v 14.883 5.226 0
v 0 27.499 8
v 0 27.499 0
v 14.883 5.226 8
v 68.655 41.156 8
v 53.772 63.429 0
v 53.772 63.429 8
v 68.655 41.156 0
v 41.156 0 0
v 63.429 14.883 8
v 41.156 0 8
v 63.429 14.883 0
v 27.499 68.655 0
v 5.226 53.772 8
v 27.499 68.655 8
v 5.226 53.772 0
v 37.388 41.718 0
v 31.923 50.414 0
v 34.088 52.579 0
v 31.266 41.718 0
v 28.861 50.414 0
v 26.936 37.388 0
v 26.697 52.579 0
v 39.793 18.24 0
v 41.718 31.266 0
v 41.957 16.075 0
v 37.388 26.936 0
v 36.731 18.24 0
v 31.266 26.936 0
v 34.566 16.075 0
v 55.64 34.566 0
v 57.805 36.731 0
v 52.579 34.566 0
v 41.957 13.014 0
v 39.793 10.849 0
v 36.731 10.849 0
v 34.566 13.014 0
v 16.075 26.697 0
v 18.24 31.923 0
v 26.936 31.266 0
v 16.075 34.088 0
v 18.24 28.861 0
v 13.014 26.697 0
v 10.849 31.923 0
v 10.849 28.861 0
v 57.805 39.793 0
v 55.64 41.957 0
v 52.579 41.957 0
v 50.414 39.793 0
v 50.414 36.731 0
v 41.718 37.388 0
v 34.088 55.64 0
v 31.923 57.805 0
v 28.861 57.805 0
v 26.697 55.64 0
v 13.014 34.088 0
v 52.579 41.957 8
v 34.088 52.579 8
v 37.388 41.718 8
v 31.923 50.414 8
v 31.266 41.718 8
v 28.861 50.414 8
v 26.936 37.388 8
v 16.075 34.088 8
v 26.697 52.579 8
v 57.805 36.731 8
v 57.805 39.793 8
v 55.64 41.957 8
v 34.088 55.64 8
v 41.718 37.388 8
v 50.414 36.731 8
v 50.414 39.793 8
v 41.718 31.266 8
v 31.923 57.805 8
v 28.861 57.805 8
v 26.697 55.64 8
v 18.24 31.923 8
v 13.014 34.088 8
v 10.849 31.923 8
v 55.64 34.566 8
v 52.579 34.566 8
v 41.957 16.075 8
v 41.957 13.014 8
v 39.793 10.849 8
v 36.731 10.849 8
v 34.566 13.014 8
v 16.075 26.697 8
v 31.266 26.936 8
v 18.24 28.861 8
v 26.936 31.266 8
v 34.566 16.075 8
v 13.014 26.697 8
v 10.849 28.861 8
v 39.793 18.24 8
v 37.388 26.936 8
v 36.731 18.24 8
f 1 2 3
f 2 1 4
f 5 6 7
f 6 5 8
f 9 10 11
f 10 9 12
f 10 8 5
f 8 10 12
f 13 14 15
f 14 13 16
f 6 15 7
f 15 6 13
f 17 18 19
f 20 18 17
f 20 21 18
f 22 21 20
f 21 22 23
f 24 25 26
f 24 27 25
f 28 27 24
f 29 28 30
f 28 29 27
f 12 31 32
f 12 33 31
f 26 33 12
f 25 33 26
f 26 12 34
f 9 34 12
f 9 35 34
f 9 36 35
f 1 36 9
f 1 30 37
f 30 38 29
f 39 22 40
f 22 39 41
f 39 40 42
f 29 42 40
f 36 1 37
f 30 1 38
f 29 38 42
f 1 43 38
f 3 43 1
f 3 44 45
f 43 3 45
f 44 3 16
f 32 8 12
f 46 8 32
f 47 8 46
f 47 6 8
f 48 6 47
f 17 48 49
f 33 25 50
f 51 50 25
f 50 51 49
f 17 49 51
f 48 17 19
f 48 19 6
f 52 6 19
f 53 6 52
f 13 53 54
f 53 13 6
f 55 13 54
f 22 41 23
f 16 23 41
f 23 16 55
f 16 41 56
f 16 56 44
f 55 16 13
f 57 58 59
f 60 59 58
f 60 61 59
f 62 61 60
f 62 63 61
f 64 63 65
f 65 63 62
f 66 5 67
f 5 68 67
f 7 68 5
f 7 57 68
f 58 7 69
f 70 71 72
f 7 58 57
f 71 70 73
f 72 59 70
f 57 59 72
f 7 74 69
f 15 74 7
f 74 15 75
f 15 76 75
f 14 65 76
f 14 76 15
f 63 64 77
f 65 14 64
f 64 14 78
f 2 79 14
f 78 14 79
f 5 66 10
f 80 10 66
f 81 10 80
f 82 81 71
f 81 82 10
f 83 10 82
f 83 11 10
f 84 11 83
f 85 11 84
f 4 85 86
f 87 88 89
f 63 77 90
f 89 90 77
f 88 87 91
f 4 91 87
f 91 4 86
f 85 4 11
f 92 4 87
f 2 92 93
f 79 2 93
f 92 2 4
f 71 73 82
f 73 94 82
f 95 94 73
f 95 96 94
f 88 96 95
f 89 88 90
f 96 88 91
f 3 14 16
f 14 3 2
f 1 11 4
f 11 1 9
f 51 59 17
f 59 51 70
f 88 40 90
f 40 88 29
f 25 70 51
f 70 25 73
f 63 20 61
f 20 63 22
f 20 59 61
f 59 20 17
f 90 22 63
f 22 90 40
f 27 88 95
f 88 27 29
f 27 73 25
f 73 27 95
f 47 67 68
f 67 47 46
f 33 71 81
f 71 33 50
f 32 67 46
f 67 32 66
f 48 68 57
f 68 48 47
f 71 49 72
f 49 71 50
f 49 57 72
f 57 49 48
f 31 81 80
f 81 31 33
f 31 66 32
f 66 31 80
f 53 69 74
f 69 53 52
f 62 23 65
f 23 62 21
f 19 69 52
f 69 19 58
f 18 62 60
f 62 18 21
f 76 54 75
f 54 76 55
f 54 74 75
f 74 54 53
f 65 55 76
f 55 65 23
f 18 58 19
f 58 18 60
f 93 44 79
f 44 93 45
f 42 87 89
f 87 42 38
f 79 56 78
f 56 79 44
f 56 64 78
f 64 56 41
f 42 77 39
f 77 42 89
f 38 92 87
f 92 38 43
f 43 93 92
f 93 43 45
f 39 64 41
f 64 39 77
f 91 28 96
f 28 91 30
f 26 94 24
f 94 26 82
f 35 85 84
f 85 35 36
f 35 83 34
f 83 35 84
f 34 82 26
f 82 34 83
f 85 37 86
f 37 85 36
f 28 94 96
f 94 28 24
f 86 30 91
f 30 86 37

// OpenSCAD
$fn = 32;

// ----------------------------------------------------------------------
// Polygon plate: 8-gon R35, 4 bolt windows
// ----------------------------------------------------------------------

// --- parameters (mm) ---
sides = 8;                // number of polygon sides
plate_r = 35;             // circumscribed radius of the polygon
bore_r = 8;               // centre bore radius
bolts = 4;                // number of bolt windows
ring_r = 20.17;           // bolt-circle radius
bolt_r = 4;               // bolt window radius
plate_t = 8;              // plate thickness, Z (extrusion height)

plate_d = 2 * plate_r;  // circumscribed diameter
bore_d = 2 * bore_r;  // centre bore diameter
bolt_d = 2 * bolt_r;  // bolt window diameter
ring_d = 2 * ring_r;  // bolt-circle diameter

profile = [[68.655, 41.156], [53.772, 63.429], [27.499, 68.655], [5.226, 53.772], [0, 27.499], [14.883, 5.226], [41.156, 0], [63.429, 14.883]];  // primary outline, 8 points, counter clockwise
void_1 = [[41.718, 37.388], [37.388, 41.718], [31.266, 41.718], [26.936, 37.388], [26.936, 31.266], [31.266, 26.936], [37.388, 26.936], [41.718, 31.266]];  // centre bore, 8 points
void_2 = [[57.805, 39.793], [55.64, 41.957], [52.579, 41.957], [50.414, 39.793], [50.414, 36.731], [52.579, 34.566], [55.64, 34.566], [57.805, 36.731]];  // bolt window 1, 8 points
void_3 = [[34.088, 55.64], [31.923, 57.805], [28.861, 57.805], [26.697, 55.64], [26.697, 52.579], [28.861, 50.414], [31.923, 50.414], [34.088, 52.579]];  // bolt window 2, 8 points
void_4 = [[18.24, 31.923], [16.075, 34.088], [13.014, 34.088], [10.849, 31.923], [10.849, 28.861], [13.014, 26.697], [16.075, 26.697], [18.24, 28.861]];  // bolt window 3, 8 points
void_5 = [[41.957, 16.075], [39.793, 18.24], [36.731, 18.24], [34.566, 16.075], [34.566, 13.014], [36.731, 10.849], [39.793, 10.849], [41.957, 13.014]];  // bolt window 4, 8 points

// --- the one profile operation ---
difference() {
  linear_extrude(height = plate_t) polygon(points = profile);
  translate([0, 0, -1])
    linear_extrude(height = plate_t + 2) polygon(points = void_1);
  translate([0, 0, -1])
    linear_extrude(height = plate_t + 2) polygon(points = void_2);
  translate([0, 0, -1])
    linear_extrude(height = plate_t + 2) polygon(points = void_3);
  translate([0, 0, -1])
    linear_extrude(height = plate_t + 2) polygon(points = void_4);
  translate([0, 0, -1])
    linear_extrude(height = plate_t + 2) polygon(points = void_5);
}
